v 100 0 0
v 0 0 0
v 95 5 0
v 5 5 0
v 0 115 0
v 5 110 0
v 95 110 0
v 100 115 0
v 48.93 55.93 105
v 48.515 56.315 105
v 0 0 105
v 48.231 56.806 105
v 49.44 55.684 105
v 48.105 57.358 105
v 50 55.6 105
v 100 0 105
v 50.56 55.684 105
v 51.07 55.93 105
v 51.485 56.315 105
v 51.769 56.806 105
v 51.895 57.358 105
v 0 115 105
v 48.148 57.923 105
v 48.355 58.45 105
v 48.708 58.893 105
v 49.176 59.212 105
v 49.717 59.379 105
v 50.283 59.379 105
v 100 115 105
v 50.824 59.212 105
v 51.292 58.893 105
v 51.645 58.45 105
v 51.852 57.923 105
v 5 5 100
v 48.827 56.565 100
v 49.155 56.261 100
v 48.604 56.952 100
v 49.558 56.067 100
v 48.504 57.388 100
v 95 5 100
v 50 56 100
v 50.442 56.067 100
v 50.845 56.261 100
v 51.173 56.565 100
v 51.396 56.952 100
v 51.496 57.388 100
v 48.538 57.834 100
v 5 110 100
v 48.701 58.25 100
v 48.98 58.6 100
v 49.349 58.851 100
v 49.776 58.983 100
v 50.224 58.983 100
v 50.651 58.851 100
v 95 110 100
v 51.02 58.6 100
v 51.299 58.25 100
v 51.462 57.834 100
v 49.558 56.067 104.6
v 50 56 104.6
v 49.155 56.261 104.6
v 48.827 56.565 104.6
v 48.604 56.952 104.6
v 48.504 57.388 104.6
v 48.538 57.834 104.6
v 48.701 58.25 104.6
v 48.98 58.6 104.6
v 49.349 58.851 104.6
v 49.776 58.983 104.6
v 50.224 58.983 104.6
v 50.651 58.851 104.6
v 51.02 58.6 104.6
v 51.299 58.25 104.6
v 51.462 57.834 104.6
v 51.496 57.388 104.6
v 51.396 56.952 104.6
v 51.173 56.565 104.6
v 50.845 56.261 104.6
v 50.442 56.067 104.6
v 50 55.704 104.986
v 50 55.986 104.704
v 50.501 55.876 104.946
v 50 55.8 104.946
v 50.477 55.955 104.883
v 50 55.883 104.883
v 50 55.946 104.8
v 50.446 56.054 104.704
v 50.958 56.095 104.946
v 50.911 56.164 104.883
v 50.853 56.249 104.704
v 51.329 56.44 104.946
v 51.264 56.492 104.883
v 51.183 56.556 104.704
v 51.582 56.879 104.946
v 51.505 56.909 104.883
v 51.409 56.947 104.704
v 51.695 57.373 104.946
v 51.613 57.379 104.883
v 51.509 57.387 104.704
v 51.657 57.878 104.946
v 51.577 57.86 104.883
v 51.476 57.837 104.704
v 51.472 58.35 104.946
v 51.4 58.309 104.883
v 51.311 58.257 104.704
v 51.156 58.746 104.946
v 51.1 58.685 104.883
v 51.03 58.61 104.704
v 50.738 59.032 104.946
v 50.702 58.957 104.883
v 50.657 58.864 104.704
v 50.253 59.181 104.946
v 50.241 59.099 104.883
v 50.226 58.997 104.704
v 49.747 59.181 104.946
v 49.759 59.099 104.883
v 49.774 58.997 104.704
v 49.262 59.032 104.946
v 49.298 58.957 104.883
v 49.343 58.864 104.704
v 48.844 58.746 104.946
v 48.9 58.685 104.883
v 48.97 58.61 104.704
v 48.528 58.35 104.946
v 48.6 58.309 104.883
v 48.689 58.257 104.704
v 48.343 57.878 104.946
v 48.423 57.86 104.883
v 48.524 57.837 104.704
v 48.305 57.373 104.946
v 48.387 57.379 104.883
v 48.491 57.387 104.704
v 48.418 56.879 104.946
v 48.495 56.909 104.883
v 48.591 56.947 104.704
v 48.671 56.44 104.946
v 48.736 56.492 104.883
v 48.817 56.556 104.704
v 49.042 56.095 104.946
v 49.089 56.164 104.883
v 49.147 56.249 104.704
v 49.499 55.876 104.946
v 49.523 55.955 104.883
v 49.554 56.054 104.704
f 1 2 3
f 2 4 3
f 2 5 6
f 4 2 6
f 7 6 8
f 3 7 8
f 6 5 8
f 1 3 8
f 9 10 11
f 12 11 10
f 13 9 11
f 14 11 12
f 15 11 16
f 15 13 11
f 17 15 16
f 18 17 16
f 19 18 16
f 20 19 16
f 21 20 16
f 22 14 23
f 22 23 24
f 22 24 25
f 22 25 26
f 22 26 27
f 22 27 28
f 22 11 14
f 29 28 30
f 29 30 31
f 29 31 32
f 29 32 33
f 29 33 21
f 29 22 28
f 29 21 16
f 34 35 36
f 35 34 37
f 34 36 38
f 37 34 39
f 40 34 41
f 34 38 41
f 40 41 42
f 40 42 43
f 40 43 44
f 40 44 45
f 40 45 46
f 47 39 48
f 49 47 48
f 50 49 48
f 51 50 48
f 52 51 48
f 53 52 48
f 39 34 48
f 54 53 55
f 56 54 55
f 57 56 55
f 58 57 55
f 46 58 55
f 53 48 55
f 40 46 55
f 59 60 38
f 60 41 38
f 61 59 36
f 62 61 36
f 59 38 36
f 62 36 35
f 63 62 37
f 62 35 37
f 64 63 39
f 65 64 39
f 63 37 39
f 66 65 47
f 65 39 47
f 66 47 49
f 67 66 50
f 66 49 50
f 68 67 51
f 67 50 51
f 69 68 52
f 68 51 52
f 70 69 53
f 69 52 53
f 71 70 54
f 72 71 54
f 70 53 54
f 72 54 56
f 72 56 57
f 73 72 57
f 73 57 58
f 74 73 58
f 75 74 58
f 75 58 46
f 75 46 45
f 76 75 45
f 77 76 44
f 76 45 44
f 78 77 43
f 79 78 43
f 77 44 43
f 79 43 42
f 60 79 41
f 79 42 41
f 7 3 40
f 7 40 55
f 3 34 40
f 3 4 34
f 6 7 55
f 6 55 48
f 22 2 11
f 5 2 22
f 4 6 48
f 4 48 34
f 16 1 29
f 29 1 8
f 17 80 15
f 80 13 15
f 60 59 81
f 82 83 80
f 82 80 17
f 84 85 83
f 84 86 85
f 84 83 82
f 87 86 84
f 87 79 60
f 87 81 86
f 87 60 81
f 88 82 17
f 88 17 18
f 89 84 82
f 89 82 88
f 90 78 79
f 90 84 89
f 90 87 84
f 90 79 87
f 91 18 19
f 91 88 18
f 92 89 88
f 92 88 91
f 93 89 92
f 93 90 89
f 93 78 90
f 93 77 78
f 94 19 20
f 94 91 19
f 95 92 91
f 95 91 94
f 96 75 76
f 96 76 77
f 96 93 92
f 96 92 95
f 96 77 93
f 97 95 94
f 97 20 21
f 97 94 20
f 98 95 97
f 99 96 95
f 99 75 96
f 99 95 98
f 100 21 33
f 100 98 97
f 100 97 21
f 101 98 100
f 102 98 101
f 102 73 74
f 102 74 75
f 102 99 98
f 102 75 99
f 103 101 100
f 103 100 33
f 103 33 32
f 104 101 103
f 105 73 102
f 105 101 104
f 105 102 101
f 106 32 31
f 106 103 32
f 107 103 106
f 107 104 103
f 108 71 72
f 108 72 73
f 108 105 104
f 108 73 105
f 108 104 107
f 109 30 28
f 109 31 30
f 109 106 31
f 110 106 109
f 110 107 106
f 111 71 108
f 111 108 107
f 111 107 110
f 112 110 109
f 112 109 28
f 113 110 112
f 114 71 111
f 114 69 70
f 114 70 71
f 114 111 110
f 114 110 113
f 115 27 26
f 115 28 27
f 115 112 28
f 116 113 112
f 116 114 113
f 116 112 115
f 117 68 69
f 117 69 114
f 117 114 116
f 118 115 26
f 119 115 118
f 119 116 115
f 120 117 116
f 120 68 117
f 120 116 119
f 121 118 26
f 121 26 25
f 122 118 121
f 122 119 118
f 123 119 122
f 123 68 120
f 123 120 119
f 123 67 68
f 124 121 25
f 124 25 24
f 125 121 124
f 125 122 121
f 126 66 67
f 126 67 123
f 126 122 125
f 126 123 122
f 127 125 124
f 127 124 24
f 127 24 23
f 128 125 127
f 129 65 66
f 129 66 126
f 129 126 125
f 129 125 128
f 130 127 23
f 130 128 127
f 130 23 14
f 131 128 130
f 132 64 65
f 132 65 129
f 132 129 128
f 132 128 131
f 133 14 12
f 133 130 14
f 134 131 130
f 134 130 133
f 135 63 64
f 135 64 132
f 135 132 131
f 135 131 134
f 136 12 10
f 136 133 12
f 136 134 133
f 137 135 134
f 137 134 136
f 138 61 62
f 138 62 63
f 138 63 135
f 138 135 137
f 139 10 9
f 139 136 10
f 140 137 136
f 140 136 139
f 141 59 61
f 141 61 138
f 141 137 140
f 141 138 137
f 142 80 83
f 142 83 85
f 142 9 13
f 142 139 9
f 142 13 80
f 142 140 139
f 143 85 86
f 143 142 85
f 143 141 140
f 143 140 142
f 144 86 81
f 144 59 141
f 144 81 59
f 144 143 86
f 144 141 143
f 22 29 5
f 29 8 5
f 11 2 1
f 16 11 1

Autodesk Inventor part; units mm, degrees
ref_plane "YZ Plane" through (0, 0, 0) normal (1, 0, 0) x (0, 1, 0)
ref_plane "XZ Plane" through (0, 0, 0) normal (0, 1, 0) x (-1, 0, 0)
ref_plane "XY Plane" through (0, 0, 0) normal (0, 0, 1) x (1, 0, 0)
sketch "Skizze1" plane through (0, 0, 0) normal (0, 0, 1) x (1, 0, 0)
  line L0 (-20, 0) -> (120, 0) projected
  line L1 (0, -23) -> (0, 138) projected
  line L2 (0, 0) -> (100, 0)
  line L3 (100, 0) -> (100, 115)
  line L4 (100, 115) -> (0, 115)
  line L5 (0, 115) -> (0, 0)
  line L6 (5, 5) -> (95, 5)
  line L7 (95, 5) -> (95, 110)
  line L8 (95, 110) -> (5, 110)
  line L9 (5, 110) -> (5, 5)
  point P0 (0, 115)
  dimension "d0" = 5
  dimension "d1" = 5
  dimension "d2" = 5
  dimension "d3" = 5
  dimension "d4" = 90
  dimension "d5" = 105
extrude "Extrusion1" add sketch "Skizze1" along normal blind 100
sketch "Skizze2" plane through (0, 0, 100) normal (0, 0, 1) x (1, 0, 0)
  line L0 (0, 115) -> (0, 0) projected
  line L1 (0, 0) -> (100, 0)
  line L2 (100, 0) -> (100, 115)
  line L3 (100, 115) -> (0, 115)
  line L4 (0, 115) -> (0, 0)
extrude "Extrusion2" add sketch "Skizze2" along normal blind 5
sketch "Skizze3" plane through (0, 0, 105) normal (0, 0, 1) x (1, 0, 0)
  line L0 (100, 0) -> (100, 115) projected
  line L1 (100, 115) -> (0, 115) projected
  point P0 (0, 0)
  point P1 (50, 57.5)
  dimension "d10" = 50
  dimension "d11" = 57.5
hole "Bohrung1" at (50, 57.5, 105) direction (0, 0, -1) diameter 3 end through all
fillet "Rundung1" radius 0.4 1 edges at (50, 59, 105)
properties part number "Deckel_Koch_final" material "PMMA-Kunststoff"
